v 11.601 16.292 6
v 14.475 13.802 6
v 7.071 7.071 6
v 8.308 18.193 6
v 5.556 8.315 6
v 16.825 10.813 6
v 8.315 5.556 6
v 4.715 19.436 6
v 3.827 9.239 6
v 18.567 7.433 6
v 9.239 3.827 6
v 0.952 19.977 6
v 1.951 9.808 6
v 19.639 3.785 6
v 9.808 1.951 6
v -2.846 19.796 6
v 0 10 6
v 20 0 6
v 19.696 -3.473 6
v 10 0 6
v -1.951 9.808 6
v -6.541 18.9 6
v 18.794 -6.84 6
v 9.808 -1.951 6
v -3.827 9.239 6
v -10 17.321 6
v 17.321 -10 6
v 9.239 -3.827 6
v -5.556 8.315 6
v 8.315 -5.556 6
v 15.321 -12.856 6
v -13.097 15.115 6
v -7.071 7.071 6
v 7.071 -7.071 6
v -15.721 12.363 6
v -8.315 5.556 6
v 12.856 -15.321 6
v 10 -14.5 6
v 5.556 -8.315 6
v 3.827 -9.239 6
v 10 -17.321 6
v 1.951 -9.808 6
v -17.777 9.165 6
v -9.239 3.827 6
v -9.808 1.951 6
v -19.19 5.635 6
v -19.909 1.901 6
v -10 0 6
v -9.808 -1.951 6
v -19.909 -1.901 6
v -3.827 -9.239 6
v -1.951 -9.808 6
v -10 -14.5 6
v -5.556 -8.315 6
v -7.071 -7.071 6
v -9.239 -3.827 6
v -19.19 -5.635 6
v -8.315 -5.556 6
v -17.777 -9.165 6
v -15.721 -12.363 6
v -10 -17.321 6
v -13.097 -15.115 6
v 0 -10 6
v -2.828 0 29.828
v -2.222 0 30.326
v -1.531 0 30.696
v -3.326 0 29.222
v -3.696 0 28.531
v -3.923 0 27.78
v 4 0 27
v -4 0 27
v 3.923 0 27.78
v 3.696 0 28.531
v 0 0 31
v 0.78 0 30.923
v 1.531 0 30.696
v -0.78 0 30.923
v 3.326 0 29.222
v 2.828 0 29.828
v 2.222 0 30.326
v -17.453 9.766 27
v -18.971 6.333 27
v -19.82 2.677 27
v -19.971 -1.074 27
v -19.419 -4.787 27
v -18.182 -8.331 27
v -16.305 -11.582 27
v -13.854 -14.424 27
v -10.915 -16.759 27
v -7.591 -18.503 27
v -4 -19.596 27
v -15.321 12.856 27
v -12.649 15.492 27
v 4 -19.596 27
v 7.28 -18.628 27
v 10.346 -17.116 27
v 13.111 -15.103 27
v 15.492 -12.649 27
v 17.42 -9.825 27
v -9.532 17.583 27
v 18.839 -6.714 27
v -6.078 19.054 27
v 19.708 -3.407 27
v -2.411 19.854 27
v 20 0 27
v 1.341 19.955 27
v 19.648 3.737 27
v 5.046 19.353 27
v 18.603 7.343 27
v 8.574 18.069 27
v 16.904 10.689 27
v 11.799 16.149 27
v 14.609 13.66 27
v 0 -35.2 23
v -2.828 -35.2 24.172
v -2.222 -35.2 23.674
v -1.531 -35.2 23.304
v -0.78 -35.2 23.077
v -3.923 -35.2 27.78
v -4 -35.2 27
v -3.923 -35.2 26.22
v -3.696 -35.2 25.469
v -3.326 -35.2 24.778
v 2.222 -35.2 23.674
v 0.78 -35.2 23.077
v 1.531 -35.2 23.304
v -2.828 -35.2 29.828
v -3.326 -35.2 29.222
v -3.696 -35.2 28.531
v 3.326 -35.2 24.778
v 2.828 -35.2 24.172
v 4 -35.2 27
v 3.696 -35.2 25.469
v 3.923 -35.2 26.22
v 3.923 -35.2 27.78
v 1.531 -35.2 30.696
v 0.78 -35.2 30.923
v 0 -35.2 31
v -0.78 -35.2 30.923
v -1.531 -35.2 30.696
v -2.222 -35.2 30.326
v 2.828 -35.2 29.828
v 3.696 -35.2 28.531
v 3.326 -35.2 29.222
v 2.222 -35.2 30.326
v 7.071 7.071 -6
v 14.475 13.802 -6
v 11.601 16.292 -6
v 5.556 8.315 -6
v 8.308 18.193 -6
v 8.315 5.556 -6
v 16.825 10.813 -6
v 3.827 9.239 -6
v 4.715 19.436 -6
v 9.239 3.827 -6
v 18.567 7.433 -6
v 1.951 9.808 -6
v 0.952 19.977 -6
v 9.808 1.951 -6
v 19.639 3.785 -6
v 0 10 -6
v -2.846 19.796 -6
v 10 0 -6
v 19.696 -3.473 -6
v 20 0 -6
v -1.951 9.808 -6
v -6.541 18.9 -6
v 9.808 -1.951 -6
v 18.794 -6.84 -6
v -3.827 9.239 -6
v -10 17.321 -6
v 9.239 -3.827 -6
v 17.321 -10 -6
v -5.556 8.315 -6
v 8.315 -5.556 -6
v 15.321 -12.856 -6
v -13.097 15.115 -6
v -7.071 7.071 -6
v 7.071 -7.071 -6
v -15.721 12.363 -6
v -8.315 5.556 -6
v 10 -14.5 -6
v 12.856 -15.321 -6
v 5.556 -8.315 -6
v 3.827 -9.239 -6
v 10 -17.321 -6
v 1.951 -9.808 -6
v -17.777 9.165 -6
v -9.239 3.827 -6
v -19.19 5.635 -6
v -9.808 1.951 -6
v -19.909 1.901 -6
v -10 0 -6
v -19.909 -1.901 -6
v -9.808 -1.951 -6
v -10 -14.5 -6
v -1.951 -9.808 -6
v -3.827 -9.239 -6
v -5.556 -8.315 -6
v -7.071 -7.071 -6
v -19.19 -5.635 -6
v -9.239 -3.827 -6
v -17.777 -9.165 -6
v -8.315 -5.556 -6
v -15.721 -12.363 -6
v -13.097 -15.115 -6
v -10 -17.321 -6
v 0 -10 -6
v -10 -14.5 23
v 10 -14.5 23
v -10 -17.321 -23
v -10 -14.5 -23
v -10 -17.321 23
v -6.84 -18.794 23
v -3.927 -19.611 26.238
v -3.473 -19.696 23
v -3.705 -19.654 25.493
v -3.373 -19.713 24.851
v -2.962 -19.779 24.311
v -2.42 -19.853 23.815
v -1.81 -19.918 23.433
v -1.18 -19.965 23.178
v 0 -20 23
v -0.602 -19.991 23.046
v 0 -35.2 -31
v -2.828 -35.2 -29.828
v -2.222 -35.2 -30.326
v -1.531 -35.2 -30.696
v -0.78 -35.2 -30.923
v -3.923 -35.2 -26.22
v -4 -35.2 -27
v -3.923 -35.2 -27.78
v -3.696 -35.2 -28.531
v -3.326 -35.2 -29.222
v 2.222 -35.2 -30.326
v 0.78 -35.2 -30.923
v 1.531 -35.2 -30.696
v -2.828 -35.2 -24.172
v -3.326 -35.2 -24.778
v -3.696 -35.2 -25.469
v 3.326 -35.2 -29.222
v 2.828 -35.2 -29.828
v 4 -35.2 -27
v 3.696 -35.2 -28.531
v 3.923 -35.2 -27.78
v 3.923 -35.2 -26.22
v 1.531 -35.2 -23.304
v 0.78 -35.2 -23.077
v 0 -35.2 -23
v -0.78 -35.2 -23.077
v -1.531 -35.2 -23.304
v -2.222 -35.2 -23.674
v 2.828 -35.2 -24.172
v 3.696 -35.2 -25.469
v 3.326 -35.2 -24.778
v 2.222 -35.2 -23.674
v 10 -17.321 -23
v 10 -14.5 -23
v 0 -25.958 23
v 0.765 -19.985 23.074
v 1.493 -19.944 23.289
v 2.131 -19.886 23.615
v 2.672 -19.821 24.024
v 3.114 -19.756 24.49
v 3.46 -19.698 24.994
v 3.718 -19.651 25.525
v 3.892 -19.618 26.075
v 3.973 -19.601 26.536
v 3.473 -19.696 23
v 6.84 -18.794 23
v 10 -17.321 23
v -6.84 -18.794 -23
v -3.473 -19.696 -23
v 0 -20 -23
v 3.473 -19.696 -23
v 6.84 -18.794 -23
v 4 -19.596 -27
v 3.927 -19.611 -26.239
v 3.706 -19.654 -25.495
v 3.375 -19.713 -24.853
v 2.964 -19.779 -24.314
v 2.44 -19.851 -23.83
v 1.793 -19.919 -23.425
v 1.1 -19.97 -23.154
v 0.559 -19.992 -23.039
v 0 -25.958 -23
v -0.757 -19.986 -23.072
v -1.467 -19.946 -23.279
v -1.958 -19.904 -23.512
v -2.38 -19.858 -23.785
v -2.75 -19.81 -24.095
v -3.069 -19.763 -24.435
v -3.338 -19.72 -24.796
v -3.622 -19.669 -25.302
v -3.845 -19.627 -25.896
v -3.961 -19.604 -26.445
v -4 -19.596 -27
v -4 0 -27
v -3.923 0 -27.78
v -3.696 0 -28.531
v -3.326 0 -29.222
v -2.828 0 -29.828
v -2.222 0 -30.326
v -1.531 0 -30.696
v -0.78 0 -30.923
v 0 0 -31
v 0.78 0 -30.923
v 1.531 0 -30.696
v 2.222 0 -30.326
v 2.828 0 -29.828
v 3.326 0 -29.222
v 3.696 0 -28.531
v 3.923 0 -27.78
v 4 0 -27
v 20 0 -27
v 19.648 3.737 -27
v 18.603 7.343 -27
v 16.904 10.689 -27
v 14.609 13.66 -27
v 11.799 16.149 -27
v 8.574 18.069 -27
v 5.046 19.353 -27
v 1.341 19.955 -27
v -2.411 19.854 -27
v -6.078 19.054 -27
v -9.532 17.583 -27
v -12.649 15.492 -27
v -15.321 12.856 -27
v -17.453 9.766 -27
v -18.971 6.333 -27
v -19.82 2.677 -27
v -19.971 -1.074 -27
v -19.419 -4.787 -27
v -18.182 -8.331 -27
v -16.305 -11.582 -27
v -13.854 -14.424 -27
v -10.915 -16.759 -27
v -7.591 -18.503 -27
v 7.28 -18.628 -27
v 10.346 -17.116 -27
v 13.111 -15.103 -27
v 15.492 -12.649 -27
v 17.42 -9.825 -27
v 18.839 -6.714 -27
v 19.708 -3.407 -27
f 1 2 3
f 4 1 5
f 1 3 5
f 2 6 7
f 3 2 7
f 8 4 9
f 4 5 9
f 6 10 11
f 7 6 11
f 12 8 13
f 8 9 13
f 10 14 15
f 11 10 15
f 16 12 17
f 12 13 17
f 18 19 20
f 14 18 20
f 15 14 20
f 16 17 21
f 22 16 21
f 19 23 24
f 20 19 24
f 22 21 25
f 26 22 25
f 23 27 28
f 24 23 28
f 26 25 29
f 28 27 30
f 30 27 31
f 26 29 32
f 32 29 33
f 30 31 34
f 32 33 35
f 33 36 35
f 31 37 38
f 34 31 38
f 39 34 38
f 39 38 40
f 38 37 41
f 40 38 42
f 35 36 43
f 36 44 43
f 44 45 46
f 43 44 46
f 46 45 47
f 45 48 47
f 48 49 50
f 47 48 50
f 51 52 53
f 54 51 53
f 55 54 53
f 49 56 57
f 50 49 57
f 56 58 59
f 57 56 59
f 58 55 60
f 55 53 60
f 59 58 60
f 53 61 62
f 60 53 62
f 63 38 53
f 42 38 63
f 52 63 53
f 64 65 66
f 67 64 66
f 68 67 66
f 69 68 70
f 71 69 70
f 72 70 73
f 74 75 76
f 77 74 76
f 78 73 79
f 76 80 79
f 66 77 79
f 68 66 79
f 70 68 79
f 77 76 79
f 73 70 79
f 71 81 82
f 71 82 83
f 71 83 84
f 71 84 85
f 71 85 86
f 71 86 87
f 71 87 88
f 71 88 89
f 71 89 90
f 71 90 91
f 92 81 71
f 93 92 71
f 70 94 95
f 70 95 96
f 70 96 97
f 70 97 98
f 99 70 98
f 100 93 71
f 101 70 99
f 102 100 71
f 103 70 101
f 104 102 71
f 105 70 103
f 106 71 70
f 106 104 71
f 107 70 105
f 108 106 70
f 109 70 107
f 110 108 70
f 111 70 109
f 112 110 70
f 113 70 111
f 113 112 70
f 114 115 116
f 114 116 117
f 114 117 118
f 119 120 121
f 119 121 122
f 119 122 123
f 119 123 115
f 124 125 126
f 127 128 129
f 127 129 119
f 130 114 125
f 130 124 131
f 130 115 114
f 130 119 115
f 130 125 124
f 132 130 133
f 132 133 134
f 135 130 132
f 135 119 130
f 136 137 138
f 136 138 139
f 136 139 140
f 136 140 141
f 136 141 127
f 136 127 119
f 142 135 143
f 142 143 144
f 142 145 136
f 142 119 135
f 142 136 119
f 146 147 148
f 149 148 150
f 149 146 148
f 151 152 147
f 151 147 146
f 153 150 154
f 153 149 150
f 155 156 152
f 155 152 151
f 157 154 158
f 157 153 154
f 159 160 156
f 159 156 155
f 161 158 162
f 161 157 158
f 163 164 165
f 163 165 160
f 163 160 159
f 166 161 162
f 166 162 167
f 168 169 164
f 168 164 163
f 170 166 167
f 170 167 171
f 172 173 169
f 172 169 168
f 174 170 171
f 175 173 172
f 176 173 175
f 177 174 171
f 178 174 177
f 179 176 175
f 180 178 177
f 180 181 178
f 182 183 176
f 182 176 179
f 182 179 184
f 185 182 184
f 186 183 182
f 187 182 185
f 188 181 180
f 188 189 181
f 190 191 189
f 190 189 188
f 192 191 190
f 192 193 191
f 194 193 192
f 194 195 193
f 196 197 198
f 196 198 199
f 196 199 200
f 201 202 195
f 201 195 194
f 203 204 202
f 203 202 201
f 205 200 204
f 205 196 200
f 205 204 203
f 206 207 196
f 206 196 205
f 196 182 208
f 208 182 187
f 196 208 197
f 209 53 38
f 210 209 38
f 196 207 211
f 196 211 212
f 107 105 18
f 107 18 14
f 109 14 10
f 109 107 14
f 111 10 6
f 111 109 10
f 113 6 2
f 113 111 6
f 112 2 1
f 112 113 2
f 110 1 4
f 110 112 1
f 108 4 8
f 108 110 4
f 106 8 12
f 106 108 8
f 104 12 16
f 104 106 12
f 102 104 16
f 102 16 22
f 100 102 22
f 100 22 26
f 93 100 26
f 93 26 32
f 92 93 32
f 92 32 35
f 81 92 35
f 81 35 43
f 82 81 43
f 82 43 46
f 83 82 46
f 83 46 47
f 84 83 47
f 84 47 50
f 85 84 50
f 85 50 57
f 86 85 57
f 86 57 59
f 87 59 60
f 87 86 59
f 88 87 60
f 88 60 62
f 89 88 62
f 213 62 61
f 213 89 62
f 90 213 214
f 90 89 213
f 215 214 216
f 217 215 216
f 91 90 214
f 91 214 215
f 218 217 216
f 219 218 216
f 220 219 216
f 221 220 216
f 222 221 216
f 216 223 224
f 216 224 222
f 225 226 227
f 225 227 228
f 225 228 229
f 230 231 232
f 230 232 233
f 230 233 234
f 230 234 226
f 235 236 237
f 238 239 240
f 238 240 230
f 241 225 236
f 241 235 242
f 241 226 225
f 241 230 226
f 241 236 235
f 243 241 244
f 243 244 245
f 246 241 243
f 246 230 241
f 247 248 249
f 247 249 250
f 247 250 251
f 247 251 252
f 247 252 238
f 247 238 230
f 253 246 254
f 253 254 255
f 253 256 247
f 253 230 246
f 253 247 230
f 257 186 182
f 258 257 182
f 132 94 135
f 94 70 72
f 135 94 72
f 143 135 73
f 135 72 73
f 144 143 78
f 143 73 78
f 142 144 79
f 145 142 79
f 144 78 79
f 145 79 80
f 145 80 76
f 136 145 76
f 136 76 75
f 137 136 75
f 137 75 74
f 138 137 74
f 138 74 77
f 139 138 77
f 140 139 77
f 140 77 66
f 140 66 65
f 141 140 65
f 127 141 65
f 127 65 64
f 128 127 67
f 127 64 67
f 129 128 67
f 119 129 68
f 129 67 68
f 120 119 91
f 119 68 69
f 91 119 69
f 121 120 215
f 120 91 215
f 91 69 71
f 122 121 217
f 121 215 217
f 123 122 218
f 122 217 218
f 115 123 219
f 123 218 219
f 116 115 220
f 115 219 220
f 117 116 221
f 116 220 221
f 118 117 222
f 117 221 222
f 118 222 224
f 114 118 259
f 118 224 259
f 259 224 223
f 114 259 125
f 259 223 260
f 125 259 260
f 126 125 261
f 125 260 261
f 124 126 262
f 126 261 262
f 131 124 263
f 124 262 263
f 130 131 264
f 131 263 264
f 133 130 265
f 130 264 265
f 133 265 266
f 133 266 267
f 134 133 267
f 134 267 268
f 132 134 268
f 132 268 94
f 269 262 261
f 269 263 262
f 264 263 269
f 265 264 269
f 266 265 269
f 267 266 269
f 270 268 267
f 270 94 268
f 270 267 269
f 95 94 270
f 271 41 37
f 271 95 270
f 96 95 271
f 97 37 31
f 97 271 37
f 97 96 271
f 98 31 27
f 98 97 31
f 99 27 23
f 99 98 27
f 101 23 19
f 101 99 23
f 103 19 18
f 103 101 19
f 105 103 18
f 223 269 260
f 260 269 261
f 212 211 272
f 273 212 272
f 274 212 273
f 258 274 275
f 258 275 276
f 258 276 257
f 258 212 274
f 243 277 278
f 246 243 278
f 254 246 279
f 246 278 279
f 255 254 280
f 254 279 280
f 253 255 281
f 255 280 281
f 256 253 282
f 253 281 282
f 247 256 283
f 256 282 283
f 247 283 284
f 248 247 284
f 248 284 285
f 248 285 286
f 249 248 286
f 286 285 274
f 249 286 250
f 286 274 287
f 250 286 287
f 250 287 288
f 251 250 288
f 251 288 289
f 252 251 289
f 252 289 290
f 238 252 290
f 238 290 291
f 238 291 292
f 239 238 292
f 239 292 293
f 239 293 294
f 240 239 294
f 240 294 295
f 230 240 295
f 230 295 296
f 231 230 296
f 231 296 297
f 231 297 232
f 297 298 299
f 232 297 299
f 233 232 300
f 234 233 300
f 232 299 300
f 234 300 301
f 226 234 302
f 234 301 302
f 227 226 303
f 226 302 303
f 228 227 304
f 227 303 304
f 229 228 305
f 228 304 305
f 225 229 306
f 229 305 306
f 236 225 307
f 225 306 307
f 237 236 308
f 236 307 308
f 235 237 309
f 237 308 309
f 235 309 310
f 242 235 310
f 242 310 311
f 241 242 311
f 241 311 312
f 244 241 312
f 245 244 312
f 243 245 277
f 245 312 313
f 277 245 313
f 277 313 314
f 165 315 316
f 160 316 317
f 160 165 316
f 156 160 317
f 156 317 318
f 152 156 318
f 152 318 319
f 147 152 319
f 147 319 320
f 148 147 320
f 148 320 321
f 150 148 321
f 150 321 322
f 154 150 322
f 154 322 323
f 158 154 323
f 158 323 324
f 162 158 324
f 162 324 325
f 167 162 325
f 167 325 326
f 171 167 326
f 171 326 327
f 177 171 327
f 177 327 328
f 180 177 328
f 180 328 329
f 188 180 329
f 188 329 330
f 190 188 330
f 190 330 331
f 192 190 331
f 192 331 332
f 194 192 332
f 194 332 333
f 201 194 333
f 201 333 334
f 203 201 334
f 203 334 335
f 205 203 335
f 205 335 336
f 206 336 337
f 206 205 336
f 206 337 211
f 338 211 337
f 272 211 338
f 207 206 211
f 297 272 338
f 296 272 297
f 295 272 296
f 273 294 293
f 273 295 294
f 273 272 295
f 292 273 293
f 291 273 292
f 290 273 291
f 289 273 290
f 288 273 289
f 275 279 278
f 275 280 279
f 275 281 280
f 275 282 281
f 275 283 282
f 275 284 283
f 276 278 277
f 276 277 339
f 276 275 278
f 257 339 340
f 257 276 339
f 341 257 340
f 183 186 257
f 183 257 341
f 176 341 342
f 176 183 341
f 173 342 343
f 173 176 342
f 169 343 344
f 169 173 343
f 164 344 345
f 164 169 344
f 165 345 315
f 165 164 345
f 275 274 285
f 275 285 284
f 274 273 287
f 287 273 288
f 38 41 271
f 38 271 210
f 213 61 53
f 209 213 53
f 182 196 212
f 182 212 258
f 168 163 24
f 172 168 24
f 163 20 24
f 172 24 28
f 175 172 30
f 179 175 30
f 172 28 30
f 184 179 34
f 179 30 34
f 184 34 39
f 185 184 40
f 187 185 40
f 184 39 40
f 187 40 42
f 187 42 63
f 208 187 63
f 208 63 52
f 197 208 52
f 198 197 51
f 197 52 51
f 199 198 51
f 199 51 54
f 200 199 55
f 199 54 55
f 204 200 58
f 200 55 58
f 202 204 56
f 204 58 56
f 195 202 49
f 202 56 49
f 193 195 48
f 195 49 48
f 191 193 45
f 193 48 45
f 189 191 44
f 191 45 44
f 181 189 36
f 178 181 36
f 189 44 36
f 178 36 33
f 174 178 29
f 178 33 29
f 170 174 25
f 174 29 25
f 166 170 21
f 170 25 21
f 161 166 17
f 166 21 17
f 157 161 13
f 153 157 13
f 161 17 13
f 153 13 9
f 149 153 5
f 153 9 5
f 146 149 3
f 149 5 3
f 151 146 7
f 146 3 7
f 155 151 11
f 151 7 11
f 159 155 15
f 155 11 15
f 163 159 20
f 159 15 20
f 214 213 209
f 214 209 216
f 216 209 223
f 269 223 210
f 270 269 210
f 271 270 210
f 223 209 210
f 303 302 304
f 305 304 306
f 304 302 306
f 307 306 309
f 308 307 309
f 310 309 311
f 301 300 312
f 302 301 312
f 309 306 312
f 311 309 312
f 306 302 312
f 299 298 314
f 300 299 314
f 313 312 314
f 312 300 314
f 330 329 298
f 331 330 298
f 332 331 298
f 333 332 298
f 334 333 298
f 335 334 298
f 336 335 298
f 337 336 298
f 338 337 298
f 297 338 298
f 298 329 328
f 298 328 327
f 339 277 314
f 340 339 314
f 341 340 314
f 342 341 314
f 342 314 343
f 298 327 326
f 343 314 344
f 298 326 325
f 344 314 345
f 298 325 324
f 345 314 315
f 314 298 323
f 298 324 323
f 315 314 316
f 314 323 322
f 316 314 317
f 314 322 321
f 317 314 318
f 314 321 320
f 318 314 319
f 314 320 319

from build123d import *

# Parameters (mm, degrees)
F0_R          = 20
F1_DEPTH      = 27
F2_W          = 19.3877541561
F2_H          = 12
F5_R          = 4
F6_DEPTH      = 35.2
F7_W          = 20
F7_H          = 11.4580463721
F8_DEPTH      = 17
F8_DEPTH_BACK = 29


with BuildPart() as f1:
    # F0 (on Top) → F1 (new body, symmetric)
    with BuildSketch(Plane.XY):
        Circle(F0_R)
    extrude(amount=F1_DEPTH, both=True)

    # F2 (on Front) → F4 (revolve, cut)
    with BuildSketch(Plane.XZ):
        with Locations((19.6938770781, 0)):
            Rectangle(F2_W, F2_H)
    revolve(axis=Axis((0, 0, 0.1814514399), (0, 0, -1)), mode=Mode.SUBTRACT)

    # F5 (on Front) → F6 (join)
    with BuildSketch(Plane.XZ):
        with Locations((0, 27)):
            Circle(F5_R)
        with Locations((0, -27)):
            Circle(F5_R)
    extrude(amount=F6_DEPTH)

    # F7 (on face) → F8 (cut, two sides)
    with BuildSketch(Plane.XY.offset(-6)) as f8_sk:
        with Locations((0, -20.229023186)):
            Rectangle(F7_W, F7_H)
    extrude(amount=-F8_DEPTH, mode=Mode.SUBTRACT)
    extrude(f8_sk.sketch, amount=F8_DEPTH_BACK, mode=Mode.SUBTRACT)


solid = f1.part
